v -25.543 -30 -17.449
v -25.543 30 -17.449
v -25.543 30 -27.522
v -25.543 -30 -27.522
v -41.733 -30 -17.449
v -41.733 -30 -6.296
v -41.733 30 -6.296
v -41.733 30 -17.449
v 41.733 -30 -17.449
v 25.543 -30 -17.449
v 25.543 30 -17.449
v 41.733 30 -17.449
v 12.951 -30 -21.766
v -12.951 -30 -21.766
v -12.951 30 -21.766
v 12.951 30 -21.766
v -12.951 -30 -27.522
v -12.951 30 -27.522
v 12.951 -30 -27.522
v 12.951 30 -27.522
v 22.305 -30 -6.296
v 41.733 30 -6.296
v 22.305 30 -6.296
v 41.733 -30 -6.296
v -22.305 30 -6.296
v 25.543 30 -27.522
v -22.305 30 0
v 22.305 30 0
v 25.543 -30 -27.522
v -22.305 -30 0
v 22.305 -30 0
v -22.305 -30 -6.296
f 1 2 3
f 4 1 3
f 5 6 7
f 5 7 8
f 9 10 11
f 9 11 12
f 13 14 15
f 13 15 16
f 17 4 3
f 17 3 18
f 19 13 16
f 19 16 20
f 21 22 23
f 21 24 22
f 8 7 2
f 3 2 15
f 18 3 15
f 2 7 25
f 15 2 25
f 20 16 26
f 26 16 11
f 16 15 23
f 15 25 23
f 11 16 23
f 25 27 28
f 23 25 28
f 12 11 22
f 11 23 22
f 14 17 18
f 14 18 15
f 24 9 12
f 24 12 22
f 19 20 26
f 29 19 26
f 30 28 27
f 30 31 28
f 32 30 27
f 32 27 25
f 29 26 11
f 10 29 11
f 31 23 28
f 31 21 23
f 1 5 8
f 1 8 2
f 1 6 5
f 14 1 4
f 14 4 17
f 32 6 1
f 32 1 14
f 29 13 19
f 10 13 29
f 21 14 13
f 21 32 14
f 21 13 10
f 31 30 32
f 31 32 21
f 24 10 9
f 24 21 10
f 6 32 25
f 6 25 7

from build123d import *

# Parameters (mm, degrees)
F1_DEPTH = 30


with BuildPart() as f1:
    # F0 (on Front) → F1 (new body, symmetric)
    with BuildSketch(Plane.XZ):
        Polygon((22.305341, 0), (0, 0), (-22.305341, 0), (-22.305341, -6.29586), (-41.732572, -6.29586), (-41.732572, -17.44853), (-25.543211, -17.44853), (-25.543211, -27.52191), (-12.951488, -27.52191), (-12.951488, -21.765692), (0, -21.765692), (12.951488, -21.765692), (12.951488, -27.52191), (25.543211, -27.52191), (25.543211, -17.44853), (41.732572, -17.44853), (41.732572, -6.29586), (22.305341, -6.29586), align=None)
    extrude(amount=F1_DEPTH, both=True)


solid = f1.part
